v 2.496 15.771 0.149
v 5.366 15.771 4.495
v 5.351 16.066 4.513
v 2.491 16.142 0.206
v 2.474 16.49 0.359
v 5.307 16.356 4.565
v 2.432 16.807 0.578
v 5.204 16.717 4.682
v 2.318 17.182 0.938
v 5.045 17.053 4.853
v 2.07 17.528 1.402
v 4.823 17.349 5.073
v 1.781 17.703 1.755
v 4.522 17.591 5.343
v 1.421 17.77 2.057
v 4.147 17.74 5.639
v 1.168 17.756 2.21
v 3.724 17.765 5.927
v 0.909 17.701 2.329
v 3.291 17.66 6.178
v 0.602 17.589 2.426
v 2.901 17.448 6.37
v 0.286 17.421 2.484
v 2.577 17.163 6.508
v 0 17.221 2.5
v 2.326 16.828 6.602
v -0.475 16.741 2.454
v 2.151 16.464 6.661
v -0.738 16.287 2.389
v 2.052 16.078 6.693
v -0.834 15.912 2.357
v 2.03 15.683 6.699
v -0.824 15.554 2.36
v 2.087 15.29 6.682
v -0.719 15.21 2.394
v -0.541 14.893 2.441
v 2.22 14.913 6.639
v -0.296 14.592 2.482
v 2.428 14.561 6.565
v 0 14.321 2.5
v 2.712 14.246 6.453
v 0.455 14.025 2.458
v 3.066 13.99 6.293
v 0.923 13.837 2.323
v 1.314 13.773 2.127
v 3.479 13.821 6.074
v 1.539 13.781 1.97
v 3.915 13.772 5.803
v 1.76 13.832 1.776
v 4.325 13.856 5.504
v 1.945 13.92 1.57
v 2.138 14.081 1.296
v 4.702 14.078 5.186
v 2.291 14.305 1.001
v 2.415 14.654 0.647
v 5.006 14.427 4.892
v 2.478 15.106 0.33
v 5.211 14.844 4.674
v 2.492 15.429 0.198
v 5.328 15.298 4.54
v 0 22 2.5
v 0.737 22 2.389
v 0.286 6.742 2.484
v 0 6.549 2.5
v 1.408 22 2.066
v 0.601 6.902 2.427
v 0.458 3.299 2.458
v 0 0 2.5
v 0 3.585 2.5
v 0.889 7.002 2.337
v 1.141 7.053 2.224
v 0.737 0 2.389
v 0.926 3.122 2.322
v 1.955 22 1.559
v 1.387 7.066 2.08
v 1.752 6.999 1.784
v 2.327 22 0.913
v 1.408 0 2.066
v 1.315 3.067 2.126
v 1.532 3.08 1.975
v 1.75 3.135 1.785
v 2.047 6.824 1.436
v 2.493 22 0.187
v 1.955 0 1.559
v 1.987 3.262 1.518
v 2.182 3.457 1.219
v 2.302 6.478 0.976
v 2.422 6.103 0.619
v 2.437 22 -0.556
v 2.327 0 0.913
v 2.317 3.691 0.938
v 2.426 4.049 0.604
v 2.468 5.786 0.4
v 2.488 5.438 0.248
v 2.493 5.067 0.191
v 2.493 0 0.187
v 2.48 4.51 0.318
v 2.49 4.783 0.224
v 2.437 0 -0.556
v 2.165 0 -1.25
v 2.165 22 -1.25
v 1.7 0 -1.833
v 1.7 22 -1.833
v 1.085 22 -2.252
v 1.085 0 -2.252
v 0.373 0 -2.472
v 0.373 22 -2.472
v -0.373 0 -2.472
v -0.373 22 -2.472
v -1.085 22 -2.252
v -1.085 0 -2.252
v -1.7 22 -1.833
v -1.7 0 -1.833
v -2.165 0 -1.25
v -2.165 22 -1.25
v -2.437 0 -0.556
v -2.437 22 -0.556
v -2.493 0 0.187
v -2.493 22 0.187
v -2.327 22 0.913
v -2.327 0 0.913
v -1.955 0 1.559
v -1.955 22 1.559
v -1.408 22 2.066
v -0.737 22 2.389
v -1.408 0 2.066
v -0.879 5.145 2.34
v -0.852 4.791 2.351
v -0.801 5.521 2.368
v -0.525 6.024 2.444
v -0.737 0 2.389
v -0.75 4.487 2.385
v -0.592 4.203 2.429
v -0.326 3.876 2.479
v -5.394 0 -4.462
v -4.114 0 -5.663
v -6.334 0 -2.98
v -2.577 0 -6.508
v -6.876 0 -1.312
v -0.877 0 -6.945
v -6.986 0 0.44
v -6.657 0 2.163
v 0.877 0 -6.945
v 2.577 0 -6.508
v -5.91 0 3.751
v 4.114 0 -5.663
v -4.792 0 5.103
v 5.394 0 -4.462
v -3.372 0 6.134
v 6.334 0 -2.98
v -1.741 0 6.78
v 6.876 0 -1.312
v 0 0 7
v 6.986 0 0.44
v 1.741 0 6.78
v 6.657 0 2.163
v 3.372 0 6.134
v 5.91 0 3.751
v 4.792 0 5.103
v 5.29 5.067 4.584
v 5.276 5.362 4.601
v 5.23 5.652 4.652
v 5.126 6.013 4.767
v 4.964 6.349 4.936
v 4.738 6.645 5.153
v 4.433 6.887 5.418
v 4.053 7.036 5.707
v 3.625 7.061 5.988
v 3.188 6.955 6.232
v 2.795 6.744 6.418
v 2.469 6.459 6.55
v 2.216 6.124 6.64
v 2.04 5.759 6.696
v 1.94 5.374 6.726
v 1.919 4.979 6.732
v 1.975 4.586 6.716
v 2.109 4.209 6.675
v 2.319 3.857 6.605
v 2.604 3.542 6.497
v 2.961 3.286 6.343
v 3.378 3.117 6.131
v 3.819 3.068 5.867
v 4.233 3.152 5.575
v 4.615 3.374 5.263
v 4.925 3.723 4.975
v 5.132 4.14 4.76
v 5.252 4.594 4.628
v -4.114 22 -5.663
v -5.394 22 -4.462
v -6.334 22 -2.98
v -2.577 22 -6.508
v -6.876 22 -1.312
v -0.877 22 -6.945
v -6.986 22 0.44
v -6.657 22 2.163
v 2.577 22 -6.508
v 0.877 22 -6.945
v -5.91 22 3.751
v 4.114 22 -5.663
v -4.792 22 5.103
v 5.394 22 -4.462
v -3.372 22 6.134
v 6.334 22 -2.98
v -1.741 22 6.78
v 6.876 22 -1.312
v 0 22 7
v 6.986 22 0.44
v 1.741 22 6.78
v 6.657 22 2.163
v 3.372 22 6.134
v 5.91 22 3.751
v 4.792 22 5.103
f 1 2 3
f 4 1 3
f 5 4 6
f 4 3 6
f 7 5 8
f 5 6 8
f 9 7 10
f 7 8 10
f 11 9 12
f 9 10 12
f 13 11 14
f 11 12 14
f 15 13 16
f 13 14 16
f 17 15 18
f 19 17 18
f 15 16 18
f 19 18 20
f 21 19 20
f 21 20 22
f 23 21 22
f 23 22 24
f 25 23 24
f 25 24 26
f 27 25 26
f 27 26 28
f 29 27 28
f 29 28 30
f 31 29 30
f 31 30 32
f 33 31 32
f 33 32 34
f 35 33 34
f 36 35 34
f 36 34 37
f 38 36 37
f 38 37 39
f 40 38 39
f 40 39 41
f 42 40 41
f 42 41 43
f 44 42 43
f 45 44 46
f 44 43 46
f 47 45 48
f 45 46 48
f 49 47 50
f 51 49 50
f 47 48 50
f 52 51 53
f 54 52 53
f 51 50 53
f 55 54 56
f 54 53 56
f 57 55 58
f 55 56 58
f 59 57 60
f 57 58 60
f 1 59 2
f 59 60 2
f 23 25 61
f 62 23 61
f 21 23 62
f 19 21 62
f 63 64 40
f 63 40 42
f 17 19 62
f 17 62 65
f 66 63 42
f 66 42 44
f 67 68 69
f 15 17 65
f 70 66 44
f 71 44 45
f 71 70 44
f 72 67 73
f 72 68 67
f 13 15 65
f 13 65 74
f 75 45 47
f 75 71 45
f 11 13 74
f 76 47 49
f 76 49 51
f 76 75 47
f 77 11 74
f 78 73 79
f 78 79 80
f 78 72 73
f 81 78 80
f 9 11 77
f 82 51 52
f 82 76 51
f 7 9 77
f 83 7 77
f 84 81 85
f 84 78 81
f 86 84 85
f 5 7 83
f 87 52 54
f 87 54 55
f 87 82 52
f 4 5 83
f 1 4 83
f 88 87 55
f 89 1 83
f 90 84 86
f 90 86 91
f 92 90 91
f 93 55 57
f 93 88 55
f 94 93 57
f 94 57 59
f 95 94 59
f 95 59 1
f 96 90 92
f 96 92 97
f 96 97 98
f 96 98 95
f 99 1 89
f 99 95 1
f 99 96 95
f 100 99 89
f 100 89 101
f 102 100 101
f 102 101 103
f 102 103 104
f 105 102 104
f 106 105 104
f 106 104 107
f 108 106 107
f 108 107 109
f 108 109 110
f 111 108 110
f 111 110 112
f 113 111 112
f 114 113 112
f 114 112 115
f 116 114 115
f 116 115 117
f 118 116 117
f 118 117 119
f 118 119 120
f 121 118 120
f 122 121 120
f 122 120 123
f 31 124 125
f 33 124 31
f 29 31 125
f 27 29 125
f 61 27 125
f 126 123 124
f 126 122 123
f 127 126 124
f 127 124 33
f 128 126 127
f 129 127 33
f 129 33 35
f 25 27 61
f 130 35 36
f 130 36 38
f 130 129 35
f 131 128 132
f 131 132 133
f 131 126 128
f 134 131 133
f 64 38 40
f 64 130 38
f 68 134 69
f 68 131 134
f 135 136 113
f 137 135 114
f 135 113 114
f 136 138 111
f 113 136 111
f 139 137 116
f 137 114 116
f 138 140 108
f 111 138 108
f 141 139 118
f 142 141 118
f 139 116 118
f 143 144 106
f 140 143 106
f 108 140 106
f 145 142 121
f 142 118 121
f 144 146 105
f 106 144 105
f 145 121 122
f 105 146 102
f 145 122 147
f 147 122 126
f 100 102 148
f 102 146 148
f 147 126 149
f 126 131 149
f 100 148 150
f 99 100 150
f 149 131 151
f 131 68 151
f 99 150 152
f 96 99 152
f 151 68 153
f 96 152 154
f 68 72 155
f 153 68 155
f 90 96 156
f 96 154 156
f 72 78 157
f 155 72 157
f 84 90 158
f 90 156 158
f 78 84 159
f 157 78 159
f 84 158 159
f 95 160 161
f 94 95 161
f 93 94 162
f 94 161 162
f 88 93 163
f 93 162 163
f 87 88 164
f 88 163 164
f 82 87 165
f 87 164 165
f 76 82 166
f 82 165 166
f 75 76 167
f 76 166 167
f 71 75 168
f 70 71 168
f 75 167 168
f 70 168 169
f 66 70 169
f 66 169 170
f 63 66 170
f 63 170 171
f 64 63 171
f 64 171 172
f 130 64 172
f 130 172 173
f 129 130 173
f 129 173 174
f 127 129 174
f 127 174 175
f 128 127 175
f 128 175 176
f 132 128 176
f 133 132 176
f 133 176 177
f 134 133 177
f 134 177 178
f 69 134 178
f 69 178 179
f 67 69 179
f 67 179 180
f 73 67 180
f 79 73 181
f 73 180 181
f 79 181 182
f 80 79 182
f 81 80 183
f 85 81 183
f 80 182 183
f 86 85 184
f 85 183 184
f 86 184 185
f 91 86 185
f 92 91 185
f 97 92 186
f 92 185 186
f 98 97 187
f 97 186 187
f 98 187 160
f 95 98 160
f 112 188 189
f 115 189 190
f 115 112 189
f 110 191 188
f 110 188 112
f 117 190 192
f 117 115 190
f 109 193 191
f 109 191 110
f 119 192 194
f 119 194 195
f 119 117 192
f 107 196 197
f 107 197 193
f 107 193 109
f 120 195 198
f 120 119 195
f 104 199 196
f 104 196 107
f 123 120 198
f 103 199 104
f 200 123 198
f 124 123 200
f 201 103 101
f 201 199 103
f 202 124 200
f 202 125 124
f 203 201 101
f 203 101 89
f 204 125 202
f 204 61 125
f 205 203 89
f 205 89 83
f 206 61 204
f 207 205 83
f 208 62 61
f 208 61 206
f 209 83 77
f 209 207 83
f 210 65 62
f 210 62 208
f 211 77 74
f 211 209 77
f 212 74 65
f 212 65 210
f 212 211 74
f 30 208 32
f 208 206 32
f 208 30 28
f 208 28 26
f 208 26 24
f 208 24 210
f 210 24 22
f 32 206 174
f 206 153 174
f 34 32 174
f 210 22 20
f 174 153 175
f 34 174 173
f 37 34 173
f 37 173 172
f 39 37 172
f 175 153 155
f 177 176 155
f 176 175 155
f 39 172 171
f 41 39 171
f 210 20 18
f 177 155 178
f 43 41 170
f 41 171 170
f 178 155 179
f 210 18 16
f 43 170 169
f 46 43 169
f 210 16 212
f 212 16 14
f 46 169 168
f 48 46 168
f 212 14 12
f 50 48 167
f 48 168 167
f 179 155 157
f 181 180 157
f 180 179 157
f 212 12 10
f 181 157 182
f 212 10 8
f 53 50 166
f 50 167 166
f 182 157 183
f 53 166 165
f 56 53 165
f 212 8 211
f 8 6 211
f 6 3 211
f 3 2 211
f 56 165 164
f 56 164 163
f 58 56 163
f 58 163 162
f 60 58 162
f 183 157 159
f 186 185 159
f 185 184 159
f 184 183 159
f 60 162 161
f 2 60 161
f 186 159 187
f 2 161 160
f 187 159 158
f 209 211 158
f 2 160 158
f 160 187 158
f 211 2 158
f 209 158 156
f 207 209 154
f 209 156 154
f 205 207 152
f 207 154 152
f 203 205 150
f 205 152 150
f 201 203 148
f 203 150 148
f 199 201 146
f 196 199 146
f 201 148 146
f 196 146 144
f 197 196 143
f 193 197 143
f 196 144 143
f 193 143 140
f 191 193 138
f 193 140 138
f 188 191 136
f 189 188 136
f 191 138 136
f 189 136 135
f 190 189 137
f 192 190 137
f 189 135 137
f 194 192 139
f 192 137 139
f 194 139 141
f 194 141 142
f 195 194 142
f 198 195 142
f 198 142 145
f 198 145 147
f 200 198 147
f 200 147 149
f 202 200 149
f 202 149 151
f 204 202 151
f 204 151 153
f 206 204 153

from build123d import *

# Parameters (mm, degrees)
SKETCH_1_R           = 7
SKETCH_1_R_2         = 2.5
EXTRUDE_1_DEPTH      = 22
MM_1_REACH           = 25.055
MM_1_BORE_R          = 2
MM_1_ON_FACE_2_REACH = 25.854
MM_1_BORE_2_R        = 2


with BuildPart() as part:
    # 草图1 → 凸台-拉伸1 (new body)
    with BuildSketch(Plane(origin=(0, 0, 0), x_dir=(1, 0, 0), z_dir=(0, 1, 0))):
        with Locations(Location((0, 0, 0), (0, 0, 270))):
            Circle(SKETCH_1_R)
        with Locations(Location((0, 0, 0), (0, 0, 270))):
            Circle(SKETCH_1_R_2, mode=Mode.SUBTRACT)
    extrude(amount=EXTRUDE_1_DEPTH)

    # 大小mm 暗销孔1 bore (on position points) → 大小mm 暗销孔1 (cut, up to next)
    with BuildSketch(Plane(origin=(3.857759844, 15.771125488, 5.841034924), x_dir=(0.834433560595, 0, -0.551108549156), z_dir=(0.551108549156, 0, 0.834433560595)), mode=Mode.PRIVATE) as mm_1_sk1:
        Circle(MM_1_BORE_R)
    mm_1_tool1 = extrude(mm_1_sk1.sketch, amount=-MM_1_REACH, mode=Mode.PRIVATE) & part.part
    add(mm_1_tool1.solids().sort_by_distance((3.85776, 15.771125, 5.841035))[0], mode=Mode.SUBTRACT)

    # 大小mm 暗销孔1 bore 2 (on position points) → 大小mm 暗销孔1 on face 2 (cut, up to next)
    with BuildSketch(Plane(origin=(3.760299327, 5.067053502, 5.904248383), x_dir=(0.843463865935, 0, -0.537185914616), z_dir=(0.537185914616, 0, 0.843463865935)), mode=Mode.PRIVATE) as mm_1_on_face_2_sk1:
        Circle(MM_1_BORE_2_R)
    mm_1_on_face_2_tool1 = extrude(mm_1_on_face_2_sk1.sketch, amount=-MM_1_ON_FACE_2_REACH, mode=Mode.PRIVATE) & part.part
    add(mm_1_on_face_2_tool1.solids().sort_by_distance((3.760299, 5.067054, 5.904248))[0], mode=Mode.SUBTRACT)


solid = part.part
